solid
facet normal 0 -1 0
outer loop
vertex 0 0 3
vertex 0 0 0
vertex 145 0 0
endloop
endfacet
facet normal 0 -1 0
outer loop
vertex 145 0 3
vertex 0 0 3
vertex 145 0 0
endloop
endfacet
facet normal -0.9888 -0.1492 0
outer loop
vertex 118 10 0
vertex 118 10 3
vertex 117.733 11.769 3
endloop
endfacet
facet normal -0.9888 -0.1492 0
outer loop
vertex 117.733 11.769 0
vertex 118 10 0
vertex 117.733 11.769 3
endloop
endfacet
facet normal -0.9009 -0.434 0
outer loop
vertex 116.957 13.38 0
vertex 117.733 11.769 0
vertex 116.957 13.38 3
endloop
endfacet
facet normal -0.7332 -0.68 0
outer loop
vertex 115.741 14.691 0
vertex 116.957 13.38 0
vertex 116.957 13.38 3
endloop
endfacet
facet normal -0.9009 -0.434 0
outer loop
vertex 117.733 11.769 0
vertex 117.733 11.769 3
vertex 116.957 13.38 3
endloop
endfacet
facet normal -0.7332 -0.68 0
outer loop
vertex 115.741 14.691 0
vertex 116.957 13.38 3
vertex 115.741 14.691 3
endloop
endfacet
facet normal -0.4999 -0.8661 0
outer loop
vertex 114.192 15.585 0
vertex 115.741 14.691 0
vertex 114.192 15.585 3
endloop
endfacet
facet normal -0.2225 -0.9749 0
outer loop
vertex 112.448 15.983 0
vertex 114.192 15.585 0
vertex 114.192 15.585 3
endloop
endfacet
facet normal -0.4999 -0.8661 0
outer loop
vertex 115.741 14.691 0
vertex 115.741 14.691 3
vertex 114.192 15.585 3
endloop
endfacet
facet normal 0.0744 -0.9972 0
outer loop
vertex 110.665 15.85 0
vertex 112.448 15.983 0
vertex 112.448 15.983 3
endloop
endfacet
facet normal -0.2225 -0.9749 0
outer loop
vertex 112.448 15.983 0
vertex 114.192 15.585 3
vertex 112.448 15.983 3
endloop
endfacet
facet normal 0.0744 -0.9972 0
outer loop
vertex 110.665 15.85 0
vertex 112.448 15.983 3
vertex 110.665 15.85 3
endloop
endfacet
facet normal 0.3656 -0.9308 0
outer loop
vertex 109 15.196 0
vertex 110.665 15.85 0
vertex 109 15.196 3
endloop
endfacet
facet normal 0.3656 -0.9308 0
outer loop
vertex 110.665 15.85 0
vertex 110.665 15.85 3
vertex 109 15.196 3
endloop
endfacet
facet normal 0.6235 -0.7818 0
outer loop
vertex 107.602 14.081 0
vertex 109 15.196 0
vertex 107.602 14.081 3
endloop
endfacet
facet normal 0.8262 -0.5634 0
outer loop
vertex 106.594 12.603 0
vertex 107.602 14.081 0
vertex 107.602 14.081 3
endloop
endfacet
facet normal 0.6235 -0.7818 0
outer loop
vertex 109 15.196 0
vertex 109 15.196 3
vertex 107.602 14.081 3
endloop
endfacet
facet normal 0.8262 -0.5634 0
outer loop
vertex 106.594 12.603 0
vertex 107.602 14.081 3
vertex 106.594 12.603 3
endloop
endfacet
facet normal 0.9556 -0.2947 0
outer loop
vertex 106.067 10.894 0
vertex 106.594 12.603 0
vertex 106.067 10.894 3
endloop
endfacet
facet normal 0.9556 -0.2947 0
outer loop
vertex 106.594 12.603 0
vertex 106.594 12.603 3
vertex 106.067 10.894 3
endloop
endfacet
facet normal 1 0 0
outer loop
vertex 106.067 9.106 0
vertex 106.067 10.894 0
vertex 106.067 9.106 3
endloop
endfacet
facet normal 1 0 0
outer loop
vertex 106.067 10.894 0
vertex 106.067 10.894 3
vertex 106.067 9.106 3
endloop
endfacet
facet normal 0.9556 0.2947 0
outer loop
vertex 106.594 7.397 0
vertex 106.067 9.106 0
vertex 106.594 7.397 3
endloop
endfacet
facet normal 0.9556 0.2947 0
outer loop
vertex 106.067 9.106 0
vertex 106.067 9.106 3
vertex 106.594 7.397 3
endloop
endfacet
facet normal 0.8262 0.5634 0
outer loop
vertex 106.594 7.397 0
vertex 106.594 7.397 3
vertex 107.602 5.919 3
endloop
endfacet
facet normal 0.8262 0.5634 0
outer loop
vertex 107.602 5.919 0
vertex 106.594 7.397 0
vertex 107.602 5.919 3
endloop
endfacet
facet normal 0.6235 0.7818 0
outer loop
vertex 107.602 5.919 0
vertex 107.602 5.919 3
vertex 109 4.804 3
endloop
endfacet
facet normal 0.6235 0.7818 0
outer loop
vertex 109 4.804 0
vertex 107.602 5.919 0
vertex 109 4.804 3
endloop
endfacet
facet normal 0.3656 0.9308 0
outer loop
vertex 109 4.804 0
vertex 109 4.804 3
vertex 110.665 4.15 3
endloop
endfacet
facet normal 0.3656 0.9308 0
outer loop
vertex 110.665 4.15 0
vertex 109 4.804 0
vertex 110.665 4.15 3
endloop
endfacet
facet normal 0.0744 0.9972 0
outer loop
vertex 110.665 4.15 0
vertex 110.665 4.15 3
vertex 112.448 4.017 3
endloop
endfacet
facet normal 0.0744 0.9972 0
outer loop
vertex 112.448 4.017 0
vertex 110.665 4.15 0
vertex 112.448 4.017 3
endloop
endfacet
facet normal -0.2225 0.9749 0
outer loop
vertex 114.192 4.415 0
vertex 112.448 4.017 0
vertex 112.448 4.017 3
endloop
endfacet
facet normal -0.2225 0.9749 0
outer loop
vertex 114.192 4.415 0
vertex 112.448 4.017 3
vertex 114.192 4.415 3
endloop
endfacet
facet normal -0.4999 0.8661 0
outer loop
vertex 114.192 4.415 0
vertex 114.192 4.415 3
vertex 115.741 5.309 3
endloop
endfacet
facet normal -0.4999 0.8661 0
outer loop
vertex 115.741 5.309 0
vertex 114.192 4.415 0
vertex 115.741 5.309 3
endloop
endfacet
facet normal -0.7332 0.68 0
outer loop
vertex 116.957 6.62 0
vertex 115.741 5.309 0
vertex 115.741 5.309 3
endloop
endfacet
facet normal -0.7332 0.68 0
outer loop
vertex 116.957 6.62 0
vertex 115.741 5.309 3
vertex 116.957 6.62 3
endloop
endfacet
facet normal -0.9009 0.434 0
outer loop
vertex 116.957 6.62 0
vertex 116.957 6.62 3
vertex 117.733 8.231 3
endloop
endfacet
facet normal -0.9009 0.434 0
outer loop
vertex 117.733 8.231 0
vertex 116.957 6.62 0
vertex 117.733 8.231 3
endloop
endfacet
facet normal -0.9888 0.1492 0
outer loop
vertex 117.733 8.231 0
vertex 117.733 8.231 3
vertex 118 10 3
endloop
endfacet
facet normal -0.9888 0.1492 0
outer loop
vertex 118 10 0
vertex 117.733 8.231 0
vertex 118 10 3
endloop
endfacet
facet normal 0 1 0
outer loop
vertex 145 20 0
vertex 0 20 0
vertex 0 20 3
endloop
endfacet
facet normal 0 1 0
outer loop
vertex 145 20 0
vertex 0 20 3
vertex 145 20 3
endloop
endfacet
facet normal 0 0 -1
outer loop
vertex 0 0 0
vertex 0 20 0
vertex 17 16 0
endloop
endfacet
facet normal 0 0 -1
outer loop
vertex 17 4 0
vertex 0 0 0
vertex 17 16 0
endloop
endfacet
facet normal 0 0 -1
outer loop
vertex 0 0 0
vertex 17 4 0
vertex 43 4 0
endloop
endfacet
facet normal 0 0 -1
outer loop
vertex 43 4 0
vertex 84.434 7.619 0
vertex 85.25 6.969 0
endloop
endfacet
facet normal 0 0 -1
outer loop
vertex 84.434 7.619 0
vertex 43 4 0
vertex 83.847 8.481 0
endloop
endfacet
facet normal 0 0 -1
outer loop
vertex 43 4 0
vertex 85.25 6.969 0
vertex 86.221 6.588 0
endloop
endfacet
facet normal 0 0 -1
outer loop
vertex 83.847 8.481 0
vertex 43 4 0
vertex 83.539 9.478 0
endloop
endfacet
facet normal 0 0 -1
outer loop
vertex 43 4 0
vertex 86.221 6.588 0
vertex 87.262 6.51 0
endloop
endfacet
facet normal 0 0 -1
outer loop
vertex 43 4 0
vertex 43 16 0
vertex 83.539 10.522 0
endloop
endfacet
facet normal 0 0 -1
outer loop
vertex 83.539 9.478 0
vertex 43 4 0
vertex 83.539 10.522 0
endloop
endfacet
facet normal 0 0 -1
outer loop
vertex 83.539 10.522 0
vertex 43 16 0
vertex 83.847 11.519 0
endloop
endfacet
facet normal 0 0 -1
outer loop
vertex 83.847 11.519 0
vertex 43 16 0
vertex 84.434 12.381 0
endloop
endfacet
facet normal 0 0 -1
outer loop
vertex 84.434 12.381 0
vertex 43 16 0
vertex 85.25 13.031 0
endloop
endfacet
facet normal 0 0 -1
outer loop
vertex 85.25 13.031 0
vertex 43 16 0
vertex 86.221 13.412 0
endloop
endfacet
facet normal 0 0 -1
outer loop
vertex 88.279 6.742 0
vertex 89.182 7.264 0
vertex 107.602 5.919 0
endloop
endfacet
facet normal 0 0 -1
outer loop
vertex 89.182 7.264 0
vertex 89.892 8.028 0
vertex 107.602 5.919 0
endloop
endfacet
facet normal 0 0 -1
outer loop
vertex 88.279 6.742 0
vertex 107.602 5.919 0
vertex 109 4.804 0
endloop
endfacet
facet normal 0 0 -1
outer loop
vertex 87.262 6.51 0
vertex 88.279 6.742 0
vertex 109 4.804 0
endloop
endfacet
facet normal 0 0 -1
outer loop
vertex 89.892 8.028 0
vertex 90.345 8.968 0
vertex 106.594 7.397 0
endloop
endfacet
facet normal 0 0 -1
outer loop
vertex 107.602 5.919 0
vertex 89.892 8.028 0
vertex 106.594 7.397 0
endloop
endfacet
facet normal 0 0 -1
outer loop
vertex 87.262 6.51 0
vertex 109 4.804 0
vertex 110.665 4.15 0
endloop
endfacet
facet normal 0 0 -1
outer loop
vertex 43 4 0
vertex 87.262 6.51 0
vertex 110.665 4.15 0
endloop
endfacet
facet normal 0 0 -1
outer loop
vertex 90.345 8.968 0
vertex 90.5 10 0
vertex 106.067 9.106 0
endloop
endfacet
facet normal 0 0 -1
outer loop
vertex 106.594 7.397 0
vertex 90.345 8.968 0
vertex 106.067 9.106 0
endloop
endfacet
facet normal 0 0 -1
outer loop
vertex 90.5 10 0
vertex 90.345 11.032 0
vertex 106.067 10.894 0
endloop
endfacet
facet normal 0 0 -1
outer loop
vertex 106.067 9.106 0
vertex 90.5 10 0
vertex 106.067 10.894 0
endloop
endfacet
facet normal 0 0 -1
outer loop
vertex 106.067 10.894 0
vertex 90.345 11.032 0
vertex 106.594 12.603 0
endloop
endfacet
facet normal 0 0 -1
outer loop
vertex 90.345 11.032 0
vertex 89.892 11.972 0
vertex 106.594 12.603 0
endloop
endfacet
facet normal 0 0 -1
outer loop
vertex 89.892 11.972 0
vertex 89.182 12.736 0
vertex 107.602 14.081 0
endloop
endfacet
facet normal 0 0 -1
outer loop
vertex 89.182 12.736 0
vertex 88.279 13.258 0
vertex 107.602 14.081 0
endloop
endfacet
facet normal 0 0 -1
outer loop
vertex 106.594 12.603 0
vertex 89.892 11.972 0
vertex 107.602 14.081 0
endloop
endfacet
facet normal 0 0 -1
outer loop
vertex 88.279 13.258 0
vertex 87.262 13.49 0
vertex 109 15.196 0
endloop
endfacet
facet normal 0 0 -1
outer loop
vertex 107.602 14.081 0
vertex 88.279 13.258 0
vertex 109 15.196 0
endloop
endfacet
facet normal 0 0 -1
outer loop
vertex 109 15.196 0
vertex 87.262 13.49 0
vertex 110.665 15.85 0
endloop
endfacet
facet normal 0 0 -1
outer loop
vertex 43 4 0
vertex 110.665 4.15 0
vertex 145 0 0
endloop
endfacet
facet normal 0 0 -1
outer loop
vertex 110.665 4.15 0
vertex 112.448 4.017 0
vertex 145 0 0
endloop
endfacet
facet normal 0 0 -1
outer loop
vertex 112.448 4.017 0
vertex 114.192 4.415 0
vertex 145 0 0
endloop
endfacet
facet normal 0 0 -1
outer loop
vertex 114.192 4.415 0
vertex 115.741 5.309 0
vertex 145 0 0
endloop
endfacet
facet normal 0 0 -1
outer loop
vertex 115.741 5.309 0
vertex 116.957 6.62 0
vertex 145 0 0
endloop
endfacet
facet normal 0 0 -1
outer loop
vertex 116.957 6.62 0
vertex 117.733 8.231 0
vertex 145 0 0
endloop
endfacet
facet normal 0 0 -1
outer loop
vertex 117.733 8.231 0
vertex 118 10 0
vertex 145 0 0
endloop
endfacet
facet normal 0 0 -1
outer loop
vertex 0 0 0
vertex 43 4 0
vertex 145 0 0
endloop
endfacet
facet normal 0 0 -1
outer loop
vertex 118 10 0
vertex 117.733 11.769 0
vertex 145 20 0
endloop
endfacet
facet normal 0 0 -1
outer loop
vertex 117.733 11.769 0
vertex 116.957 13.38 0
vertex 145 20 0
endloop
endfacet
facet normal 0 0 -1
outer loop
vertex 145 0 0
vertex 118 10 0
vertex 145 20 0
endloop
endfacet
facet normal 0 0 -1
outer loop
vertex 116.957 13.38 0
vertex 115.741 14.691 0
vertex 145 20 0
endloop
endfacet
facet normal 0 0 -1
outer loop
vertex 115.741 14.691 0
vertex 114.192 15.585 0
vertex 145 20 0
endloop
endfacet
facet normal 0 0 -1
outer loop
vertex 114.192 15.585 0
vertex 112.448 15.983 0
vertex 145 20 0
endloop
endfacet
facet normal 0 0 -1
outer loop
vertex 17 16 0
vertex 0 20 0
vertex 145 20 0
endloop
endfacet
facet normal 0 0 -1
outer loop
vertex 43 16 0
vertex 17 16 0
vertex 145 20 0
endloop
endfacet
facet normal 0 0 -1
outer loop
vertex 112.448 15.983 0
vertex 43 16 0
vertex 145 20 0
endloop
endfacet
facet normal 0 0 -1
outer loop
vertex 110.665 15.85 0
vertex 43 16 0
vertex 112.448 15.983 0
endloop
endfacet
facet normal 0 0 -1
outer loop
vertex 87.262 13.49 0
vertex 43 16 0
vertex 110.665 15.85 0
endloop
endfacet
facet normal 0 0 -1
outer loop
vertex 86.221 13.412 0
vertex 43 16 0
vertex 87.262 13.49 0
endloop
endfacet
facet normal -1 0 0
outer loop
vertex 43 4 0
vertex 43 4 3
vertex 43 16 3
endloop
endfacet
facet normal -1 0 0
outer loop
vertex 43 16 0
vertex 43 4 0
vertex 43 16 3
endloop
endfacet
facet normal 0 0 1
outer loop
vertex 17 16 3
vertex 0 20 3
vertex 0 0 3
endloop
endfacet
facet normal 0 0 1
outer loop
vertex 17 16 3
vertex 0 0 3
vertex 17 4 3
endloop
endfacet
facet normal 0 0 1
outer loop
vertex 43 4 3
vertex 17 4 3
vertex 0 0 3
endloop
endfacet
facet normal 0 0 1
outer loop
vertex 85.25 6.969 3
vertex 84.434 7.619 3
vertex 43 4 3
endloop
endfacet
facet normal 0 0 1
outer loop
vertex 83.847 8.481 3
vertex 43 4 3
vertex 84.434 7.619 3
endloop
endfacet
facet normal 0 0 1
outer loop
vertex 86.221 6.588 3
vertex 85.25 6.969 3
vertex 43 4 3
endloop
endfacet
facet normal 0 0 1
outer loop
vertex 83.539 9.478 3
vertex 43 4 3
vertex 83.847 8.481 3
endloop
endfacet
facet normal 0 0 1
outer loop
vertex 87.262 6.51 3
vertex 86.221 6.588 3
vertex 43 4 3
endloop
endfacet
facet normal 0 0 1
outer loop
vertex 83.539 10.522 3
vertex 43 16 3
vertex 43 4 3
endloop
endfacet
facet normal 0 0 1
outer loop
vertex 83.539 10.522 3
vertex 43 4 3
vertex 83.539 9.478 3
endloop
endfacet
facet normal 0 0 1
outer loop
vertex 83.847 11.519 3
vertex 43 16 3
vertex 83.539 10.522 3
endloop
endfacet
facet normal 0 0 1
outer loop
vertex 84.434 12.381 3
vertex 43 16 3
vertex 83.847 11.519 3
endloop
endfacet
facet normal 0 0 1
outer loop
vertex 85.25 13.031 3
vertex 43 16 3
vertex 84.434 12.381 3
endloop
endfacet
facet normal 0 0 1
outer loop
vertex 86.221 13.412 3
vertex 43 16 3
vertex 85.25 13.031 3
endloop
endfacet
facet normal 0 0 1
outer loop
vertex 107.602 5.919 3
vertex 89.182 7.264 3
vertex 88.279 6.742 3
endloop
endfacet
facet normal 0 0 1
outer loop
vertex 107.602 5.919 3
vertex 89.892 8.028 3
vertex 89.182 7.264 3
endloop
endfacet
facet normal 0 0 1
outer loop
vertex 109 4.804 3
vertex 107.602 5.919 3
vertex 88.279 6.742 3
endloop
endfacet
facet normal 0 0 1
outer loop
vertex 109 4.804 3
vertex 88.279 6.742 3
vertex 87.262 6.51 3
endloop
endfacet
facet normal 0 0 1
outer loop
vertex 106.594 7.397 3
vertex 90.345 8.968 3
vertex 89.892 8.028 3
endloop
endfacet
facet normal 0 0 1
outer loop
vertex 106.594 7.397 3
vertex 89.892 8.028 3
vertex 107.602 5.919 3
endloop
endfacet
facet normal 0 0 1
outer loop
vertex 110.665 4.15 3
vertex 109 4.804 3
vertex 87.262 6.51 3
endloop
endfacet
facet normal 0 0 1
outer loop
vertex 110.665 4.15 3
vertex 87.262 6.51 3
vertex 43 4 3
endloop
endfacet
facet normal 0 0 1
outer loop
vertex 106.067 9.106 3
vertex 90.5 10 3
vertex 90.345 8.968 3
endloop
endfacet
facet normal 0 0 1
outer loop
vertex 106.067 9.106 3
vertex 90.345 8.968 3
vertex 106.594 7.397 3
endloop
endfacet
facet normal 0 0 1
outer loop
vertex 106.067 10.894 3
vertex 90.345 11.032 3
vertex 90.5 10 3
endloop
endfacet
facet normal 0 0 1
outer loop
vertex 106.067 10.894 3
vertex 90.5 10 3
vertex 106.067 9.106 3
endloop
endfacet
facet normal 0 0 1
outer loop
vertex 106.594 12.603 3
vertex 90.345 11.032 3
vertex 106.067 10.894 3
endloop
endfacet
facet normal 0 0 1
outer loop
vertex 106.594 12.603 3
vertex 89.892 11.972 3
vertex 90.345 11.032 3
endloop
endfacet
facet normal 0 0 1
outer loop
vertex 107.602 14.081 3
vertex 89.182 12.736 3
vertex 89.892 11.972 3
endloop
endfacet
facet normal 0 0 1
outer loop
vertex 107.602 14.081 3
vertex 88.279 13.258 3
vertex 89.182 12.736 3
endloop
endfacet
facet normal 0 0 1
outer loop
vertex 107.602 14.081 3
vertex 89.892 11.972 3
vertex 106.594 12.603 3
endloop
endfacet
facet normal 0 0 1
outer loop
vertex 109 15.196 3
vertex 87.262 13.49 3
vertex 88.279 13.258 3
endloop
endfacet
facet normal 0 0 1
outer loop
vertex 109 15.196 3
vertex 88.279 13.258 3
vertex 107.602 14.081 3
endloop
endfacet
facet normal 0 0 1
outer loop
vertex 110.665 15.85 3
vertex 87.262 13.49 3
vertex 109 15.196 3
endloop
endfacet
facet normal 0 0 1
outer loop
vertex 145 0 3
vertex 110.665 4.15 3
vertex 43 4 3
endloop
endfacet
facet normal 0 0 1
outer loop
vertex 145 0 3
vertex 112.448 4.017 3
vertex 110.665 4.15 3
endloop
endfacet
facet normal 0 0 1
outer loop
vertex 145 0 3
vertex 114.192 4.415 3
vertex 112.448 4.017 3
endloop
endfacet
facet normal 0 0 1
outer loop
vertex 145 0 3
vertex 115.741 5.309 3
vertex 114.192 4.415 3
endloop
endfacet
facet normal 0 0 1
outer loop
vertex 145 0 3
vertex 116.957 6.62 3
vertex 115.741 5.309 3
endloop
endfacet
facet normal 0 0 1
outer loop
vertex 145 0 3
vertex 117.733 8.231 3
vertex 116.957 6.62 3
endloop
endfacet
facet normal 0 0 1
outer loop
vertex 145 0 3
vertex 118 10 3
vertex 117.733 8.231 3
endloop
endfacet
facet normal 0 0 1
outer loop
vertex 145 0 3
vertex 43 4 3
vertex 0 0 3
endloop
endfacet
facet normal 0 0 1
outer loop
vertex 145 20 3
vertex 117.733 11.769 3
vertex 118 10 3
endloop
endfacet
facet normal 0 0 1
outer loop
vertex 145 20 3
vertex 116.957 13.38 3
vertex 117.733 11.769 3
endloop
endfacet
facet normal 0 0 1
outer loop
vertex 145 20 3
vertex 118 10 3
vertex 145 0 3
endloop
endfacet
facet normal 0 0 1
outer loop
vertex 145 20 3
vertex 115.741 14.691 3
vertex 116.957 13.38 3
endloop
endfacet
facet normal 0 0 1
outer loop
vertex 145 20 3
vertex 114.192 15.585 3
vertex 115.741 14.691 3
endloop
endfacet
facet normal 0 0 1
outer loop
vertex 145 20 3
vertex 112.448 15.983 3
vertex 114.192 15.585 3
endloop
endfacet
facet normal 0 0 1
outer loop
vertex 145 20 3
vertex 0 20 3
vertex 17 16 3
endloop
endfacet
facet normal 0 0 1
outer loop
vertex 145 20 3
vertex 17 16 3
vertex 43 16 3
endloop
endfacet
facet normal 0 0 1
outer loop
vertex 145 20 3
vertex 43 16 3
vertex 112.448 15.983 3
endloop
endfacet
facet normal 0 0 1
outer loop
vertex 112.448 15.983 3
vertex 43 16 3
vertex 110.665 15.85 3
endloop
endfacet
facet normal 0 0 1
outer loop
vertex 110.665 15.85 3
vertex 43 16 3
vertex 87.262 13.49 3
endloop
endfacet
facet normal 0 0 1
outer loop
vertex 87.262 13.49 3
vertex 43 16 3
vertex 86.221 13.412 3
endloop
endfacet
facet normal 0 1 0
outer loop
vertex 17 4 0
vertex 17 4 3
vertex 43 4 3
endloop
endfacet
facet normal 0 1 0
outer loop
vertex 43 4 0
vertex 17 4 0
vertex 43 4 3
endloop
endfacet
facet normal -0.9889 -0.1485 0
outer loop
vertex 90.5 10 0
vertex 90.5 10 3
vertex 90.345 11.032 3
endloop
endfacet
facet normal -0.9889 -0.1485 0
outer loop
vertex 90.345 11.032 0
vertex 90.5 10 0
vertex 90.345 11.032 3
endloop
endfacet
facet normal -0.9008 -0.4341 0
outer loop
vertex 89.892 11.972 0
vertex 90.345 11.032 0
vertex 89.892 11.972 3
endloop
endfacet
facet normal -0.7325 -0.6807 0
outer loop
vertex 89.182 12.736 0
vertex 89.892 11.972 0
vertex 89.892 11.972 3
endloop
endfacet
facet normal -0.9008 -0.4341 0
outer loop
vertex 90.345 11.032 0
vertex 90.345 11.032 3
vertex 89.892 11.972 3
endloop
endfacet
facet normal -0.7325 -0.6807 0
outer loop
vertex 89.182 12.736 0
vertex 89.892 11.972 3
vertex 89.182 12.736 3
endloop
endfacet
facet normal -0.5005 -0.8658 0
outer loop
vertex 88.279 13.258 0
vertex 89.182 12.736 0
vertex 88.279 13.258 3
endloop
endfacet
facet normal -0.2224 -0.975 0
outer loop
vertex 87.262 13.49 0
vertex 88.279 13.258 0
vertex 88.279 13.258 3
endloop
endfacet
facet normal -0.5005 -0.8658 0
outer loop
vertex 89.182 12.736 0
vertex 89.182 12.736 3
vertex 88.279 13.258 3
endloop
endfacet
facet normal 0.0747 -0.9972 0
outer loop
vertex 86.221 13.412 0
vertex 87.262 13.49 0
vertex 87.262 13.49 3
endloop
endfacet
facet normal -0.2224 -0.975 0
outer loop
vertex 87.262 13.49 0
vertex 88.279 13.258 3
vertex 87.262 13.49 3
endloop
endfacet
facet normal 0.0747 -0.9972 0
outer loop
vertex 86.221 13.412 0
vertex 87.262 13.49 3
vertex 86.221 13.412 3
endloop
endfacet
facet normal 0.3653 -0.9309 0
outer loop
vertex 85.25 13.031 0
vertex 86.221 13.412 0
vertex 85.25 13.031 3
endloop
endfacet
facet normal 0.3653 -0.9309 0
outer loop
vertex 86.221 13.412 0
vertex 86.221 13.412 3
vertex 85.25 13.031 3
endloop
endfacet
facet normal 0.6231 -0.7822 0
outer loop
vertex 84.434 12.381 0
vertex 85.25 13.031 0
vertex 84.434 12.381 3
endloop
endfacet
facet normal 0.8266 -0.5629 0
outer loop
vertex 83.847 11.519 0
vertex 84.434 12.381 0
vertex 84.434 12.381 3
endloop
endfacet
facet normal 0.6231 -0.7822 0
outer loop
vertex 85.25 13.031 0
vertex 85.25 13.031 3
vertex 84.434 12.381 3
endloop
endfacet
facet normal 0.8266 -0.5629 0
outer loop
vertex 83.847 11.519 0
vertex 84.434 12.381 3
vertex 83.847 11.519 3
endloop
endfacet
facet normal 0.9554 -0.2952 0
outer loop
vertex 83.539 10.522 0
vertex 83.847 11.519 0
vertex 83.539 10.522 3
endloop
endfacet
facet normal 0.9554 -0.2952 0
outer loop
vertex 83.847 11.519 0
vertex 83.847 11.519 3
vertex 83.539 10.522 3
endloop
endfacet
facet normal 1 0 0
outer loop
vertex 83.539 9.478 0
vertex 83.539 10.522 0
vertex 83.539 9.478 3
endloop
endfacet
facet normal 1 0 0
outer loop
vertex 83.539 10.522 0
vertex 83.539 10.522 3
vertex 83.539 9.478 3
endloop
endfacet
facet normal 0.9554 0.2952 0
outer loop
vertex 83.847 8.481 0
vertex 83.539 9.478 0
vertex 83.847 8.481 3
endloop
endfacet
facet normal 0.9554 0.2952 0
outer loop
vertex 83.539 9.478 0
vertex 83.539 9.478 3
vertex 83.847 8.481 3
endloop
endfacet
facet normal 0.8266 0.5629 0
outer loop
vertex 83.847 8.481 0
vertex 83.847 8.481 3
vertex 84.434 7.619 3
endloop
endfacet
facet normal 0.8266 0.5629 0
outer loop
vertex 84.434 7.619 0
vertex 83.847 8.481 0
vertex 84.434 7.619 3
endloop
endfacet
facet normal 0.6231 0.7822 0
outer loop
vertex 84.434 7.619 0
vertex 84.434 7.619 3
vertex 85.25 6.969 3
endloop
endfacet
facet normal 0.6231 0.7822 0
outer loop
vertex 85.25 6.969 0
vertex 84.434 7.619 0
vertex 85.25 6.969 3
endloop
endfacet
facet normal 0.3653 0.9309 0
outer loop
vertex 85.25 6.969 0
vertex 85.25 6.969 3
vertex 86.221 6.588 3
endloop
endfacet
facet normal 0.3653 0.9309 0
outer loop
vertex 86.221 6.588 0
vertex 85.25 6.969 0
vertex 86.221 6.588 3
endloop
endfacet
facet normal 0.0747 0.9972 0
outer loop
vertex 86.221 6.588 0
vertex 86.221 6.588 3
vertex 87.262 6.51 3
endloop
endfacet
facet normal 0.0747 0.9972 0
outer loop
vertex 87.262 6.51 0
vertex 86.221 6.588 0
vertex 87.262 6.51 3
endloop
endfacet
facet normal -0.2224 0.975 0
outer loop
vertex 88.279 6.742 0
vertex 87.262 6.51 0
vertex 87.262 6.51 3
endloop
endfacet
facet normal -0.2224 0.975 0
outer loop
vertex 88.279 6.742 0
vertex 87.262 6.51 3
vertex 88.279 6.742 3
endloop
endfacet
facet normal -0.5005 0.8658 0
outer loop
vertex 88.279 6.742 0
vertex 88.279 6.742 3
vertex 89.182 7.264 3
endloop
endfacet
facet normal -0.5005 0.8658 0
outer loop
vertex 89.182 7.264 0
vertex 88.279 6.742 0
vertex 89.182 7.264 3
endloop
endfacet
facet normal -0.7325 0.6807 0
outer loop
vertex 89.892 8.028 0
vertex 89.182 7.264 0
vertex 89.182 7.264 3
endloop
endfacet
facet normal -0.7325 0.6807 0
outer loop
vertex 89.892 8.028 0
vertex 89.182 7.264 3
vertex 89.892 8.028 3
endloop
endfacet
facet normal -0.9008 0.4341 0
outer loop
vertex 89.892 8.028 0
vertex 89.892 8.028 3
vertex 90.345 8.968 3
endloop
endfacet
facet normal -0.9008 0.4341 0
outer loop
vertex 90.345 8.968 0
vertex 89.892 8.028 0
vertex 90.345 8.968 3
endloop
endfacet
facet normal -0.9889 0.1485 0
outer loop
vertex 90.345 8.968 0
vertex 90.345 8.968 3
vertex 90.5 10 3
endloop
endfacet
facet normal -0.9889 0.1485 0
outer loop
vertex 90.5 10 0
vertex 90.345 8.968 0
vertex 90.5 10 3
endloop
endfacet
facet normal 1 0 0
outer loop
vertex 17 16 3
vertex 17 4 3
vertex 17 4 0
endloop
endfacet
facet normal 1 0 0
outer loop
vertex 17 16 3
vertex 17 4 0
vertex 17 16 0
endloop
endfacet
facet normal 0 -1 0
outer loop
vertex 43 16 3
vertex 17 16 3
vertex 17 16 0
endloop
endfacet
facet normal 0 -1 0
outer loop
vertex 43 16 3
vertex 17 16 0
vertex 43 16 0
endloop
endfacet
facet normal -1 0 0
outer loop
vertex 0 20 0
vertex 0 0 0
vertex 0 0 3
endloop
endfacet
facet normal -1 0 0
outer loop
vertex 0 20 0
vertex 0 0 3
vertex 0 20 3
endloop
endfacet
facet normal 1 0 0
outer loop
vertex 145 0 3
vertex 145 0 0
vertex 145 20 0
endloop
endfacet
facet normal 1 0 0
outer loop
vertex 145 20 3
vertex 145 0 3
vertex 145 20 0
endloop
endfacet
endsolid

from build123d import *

# Parameters (mm, degrees)
SKETCH1_W           = 145
SKETCH1_H           = 20
BOSS_EXTRUDE1_DEPTH = 3
SKETCH2_R           = 3.5
SKETCH2_R_2         = 6
SKETCH2_W           = 26
SKETCH2_H           = 12
CUT_EXTRUDE1_DEPTH  = 4


with BuildPart() as part:
    # Sketch1 → Boss-Extrude1 (new body)
    with BuildSketch(Plane.XY):
        with Locations((72.5, 10)):
            Rectangle(SKETCH1_W, SKETCH1_H)
    extrude(amount=BOSS_EXTRUDE1_DEPTH)

    # Sketch2 → Cut-Extrude1 (cut, through all)
    with BuildSketch(Plane.XY.offset(3)):
        with Locations((87, 10)):
            Circle(SKETCH2_R)
        with Locations((112, 10)):
            Circle(SKETCH2_R_2)
        with Locations((30, 10)):
            Rectangle(SKETCH2_W, SKETCH2_H)
    extrude(amount=-CUT_EXTRUDE1_DEPTH, mode=Mode.SUBTRACT)


solid = part.part
